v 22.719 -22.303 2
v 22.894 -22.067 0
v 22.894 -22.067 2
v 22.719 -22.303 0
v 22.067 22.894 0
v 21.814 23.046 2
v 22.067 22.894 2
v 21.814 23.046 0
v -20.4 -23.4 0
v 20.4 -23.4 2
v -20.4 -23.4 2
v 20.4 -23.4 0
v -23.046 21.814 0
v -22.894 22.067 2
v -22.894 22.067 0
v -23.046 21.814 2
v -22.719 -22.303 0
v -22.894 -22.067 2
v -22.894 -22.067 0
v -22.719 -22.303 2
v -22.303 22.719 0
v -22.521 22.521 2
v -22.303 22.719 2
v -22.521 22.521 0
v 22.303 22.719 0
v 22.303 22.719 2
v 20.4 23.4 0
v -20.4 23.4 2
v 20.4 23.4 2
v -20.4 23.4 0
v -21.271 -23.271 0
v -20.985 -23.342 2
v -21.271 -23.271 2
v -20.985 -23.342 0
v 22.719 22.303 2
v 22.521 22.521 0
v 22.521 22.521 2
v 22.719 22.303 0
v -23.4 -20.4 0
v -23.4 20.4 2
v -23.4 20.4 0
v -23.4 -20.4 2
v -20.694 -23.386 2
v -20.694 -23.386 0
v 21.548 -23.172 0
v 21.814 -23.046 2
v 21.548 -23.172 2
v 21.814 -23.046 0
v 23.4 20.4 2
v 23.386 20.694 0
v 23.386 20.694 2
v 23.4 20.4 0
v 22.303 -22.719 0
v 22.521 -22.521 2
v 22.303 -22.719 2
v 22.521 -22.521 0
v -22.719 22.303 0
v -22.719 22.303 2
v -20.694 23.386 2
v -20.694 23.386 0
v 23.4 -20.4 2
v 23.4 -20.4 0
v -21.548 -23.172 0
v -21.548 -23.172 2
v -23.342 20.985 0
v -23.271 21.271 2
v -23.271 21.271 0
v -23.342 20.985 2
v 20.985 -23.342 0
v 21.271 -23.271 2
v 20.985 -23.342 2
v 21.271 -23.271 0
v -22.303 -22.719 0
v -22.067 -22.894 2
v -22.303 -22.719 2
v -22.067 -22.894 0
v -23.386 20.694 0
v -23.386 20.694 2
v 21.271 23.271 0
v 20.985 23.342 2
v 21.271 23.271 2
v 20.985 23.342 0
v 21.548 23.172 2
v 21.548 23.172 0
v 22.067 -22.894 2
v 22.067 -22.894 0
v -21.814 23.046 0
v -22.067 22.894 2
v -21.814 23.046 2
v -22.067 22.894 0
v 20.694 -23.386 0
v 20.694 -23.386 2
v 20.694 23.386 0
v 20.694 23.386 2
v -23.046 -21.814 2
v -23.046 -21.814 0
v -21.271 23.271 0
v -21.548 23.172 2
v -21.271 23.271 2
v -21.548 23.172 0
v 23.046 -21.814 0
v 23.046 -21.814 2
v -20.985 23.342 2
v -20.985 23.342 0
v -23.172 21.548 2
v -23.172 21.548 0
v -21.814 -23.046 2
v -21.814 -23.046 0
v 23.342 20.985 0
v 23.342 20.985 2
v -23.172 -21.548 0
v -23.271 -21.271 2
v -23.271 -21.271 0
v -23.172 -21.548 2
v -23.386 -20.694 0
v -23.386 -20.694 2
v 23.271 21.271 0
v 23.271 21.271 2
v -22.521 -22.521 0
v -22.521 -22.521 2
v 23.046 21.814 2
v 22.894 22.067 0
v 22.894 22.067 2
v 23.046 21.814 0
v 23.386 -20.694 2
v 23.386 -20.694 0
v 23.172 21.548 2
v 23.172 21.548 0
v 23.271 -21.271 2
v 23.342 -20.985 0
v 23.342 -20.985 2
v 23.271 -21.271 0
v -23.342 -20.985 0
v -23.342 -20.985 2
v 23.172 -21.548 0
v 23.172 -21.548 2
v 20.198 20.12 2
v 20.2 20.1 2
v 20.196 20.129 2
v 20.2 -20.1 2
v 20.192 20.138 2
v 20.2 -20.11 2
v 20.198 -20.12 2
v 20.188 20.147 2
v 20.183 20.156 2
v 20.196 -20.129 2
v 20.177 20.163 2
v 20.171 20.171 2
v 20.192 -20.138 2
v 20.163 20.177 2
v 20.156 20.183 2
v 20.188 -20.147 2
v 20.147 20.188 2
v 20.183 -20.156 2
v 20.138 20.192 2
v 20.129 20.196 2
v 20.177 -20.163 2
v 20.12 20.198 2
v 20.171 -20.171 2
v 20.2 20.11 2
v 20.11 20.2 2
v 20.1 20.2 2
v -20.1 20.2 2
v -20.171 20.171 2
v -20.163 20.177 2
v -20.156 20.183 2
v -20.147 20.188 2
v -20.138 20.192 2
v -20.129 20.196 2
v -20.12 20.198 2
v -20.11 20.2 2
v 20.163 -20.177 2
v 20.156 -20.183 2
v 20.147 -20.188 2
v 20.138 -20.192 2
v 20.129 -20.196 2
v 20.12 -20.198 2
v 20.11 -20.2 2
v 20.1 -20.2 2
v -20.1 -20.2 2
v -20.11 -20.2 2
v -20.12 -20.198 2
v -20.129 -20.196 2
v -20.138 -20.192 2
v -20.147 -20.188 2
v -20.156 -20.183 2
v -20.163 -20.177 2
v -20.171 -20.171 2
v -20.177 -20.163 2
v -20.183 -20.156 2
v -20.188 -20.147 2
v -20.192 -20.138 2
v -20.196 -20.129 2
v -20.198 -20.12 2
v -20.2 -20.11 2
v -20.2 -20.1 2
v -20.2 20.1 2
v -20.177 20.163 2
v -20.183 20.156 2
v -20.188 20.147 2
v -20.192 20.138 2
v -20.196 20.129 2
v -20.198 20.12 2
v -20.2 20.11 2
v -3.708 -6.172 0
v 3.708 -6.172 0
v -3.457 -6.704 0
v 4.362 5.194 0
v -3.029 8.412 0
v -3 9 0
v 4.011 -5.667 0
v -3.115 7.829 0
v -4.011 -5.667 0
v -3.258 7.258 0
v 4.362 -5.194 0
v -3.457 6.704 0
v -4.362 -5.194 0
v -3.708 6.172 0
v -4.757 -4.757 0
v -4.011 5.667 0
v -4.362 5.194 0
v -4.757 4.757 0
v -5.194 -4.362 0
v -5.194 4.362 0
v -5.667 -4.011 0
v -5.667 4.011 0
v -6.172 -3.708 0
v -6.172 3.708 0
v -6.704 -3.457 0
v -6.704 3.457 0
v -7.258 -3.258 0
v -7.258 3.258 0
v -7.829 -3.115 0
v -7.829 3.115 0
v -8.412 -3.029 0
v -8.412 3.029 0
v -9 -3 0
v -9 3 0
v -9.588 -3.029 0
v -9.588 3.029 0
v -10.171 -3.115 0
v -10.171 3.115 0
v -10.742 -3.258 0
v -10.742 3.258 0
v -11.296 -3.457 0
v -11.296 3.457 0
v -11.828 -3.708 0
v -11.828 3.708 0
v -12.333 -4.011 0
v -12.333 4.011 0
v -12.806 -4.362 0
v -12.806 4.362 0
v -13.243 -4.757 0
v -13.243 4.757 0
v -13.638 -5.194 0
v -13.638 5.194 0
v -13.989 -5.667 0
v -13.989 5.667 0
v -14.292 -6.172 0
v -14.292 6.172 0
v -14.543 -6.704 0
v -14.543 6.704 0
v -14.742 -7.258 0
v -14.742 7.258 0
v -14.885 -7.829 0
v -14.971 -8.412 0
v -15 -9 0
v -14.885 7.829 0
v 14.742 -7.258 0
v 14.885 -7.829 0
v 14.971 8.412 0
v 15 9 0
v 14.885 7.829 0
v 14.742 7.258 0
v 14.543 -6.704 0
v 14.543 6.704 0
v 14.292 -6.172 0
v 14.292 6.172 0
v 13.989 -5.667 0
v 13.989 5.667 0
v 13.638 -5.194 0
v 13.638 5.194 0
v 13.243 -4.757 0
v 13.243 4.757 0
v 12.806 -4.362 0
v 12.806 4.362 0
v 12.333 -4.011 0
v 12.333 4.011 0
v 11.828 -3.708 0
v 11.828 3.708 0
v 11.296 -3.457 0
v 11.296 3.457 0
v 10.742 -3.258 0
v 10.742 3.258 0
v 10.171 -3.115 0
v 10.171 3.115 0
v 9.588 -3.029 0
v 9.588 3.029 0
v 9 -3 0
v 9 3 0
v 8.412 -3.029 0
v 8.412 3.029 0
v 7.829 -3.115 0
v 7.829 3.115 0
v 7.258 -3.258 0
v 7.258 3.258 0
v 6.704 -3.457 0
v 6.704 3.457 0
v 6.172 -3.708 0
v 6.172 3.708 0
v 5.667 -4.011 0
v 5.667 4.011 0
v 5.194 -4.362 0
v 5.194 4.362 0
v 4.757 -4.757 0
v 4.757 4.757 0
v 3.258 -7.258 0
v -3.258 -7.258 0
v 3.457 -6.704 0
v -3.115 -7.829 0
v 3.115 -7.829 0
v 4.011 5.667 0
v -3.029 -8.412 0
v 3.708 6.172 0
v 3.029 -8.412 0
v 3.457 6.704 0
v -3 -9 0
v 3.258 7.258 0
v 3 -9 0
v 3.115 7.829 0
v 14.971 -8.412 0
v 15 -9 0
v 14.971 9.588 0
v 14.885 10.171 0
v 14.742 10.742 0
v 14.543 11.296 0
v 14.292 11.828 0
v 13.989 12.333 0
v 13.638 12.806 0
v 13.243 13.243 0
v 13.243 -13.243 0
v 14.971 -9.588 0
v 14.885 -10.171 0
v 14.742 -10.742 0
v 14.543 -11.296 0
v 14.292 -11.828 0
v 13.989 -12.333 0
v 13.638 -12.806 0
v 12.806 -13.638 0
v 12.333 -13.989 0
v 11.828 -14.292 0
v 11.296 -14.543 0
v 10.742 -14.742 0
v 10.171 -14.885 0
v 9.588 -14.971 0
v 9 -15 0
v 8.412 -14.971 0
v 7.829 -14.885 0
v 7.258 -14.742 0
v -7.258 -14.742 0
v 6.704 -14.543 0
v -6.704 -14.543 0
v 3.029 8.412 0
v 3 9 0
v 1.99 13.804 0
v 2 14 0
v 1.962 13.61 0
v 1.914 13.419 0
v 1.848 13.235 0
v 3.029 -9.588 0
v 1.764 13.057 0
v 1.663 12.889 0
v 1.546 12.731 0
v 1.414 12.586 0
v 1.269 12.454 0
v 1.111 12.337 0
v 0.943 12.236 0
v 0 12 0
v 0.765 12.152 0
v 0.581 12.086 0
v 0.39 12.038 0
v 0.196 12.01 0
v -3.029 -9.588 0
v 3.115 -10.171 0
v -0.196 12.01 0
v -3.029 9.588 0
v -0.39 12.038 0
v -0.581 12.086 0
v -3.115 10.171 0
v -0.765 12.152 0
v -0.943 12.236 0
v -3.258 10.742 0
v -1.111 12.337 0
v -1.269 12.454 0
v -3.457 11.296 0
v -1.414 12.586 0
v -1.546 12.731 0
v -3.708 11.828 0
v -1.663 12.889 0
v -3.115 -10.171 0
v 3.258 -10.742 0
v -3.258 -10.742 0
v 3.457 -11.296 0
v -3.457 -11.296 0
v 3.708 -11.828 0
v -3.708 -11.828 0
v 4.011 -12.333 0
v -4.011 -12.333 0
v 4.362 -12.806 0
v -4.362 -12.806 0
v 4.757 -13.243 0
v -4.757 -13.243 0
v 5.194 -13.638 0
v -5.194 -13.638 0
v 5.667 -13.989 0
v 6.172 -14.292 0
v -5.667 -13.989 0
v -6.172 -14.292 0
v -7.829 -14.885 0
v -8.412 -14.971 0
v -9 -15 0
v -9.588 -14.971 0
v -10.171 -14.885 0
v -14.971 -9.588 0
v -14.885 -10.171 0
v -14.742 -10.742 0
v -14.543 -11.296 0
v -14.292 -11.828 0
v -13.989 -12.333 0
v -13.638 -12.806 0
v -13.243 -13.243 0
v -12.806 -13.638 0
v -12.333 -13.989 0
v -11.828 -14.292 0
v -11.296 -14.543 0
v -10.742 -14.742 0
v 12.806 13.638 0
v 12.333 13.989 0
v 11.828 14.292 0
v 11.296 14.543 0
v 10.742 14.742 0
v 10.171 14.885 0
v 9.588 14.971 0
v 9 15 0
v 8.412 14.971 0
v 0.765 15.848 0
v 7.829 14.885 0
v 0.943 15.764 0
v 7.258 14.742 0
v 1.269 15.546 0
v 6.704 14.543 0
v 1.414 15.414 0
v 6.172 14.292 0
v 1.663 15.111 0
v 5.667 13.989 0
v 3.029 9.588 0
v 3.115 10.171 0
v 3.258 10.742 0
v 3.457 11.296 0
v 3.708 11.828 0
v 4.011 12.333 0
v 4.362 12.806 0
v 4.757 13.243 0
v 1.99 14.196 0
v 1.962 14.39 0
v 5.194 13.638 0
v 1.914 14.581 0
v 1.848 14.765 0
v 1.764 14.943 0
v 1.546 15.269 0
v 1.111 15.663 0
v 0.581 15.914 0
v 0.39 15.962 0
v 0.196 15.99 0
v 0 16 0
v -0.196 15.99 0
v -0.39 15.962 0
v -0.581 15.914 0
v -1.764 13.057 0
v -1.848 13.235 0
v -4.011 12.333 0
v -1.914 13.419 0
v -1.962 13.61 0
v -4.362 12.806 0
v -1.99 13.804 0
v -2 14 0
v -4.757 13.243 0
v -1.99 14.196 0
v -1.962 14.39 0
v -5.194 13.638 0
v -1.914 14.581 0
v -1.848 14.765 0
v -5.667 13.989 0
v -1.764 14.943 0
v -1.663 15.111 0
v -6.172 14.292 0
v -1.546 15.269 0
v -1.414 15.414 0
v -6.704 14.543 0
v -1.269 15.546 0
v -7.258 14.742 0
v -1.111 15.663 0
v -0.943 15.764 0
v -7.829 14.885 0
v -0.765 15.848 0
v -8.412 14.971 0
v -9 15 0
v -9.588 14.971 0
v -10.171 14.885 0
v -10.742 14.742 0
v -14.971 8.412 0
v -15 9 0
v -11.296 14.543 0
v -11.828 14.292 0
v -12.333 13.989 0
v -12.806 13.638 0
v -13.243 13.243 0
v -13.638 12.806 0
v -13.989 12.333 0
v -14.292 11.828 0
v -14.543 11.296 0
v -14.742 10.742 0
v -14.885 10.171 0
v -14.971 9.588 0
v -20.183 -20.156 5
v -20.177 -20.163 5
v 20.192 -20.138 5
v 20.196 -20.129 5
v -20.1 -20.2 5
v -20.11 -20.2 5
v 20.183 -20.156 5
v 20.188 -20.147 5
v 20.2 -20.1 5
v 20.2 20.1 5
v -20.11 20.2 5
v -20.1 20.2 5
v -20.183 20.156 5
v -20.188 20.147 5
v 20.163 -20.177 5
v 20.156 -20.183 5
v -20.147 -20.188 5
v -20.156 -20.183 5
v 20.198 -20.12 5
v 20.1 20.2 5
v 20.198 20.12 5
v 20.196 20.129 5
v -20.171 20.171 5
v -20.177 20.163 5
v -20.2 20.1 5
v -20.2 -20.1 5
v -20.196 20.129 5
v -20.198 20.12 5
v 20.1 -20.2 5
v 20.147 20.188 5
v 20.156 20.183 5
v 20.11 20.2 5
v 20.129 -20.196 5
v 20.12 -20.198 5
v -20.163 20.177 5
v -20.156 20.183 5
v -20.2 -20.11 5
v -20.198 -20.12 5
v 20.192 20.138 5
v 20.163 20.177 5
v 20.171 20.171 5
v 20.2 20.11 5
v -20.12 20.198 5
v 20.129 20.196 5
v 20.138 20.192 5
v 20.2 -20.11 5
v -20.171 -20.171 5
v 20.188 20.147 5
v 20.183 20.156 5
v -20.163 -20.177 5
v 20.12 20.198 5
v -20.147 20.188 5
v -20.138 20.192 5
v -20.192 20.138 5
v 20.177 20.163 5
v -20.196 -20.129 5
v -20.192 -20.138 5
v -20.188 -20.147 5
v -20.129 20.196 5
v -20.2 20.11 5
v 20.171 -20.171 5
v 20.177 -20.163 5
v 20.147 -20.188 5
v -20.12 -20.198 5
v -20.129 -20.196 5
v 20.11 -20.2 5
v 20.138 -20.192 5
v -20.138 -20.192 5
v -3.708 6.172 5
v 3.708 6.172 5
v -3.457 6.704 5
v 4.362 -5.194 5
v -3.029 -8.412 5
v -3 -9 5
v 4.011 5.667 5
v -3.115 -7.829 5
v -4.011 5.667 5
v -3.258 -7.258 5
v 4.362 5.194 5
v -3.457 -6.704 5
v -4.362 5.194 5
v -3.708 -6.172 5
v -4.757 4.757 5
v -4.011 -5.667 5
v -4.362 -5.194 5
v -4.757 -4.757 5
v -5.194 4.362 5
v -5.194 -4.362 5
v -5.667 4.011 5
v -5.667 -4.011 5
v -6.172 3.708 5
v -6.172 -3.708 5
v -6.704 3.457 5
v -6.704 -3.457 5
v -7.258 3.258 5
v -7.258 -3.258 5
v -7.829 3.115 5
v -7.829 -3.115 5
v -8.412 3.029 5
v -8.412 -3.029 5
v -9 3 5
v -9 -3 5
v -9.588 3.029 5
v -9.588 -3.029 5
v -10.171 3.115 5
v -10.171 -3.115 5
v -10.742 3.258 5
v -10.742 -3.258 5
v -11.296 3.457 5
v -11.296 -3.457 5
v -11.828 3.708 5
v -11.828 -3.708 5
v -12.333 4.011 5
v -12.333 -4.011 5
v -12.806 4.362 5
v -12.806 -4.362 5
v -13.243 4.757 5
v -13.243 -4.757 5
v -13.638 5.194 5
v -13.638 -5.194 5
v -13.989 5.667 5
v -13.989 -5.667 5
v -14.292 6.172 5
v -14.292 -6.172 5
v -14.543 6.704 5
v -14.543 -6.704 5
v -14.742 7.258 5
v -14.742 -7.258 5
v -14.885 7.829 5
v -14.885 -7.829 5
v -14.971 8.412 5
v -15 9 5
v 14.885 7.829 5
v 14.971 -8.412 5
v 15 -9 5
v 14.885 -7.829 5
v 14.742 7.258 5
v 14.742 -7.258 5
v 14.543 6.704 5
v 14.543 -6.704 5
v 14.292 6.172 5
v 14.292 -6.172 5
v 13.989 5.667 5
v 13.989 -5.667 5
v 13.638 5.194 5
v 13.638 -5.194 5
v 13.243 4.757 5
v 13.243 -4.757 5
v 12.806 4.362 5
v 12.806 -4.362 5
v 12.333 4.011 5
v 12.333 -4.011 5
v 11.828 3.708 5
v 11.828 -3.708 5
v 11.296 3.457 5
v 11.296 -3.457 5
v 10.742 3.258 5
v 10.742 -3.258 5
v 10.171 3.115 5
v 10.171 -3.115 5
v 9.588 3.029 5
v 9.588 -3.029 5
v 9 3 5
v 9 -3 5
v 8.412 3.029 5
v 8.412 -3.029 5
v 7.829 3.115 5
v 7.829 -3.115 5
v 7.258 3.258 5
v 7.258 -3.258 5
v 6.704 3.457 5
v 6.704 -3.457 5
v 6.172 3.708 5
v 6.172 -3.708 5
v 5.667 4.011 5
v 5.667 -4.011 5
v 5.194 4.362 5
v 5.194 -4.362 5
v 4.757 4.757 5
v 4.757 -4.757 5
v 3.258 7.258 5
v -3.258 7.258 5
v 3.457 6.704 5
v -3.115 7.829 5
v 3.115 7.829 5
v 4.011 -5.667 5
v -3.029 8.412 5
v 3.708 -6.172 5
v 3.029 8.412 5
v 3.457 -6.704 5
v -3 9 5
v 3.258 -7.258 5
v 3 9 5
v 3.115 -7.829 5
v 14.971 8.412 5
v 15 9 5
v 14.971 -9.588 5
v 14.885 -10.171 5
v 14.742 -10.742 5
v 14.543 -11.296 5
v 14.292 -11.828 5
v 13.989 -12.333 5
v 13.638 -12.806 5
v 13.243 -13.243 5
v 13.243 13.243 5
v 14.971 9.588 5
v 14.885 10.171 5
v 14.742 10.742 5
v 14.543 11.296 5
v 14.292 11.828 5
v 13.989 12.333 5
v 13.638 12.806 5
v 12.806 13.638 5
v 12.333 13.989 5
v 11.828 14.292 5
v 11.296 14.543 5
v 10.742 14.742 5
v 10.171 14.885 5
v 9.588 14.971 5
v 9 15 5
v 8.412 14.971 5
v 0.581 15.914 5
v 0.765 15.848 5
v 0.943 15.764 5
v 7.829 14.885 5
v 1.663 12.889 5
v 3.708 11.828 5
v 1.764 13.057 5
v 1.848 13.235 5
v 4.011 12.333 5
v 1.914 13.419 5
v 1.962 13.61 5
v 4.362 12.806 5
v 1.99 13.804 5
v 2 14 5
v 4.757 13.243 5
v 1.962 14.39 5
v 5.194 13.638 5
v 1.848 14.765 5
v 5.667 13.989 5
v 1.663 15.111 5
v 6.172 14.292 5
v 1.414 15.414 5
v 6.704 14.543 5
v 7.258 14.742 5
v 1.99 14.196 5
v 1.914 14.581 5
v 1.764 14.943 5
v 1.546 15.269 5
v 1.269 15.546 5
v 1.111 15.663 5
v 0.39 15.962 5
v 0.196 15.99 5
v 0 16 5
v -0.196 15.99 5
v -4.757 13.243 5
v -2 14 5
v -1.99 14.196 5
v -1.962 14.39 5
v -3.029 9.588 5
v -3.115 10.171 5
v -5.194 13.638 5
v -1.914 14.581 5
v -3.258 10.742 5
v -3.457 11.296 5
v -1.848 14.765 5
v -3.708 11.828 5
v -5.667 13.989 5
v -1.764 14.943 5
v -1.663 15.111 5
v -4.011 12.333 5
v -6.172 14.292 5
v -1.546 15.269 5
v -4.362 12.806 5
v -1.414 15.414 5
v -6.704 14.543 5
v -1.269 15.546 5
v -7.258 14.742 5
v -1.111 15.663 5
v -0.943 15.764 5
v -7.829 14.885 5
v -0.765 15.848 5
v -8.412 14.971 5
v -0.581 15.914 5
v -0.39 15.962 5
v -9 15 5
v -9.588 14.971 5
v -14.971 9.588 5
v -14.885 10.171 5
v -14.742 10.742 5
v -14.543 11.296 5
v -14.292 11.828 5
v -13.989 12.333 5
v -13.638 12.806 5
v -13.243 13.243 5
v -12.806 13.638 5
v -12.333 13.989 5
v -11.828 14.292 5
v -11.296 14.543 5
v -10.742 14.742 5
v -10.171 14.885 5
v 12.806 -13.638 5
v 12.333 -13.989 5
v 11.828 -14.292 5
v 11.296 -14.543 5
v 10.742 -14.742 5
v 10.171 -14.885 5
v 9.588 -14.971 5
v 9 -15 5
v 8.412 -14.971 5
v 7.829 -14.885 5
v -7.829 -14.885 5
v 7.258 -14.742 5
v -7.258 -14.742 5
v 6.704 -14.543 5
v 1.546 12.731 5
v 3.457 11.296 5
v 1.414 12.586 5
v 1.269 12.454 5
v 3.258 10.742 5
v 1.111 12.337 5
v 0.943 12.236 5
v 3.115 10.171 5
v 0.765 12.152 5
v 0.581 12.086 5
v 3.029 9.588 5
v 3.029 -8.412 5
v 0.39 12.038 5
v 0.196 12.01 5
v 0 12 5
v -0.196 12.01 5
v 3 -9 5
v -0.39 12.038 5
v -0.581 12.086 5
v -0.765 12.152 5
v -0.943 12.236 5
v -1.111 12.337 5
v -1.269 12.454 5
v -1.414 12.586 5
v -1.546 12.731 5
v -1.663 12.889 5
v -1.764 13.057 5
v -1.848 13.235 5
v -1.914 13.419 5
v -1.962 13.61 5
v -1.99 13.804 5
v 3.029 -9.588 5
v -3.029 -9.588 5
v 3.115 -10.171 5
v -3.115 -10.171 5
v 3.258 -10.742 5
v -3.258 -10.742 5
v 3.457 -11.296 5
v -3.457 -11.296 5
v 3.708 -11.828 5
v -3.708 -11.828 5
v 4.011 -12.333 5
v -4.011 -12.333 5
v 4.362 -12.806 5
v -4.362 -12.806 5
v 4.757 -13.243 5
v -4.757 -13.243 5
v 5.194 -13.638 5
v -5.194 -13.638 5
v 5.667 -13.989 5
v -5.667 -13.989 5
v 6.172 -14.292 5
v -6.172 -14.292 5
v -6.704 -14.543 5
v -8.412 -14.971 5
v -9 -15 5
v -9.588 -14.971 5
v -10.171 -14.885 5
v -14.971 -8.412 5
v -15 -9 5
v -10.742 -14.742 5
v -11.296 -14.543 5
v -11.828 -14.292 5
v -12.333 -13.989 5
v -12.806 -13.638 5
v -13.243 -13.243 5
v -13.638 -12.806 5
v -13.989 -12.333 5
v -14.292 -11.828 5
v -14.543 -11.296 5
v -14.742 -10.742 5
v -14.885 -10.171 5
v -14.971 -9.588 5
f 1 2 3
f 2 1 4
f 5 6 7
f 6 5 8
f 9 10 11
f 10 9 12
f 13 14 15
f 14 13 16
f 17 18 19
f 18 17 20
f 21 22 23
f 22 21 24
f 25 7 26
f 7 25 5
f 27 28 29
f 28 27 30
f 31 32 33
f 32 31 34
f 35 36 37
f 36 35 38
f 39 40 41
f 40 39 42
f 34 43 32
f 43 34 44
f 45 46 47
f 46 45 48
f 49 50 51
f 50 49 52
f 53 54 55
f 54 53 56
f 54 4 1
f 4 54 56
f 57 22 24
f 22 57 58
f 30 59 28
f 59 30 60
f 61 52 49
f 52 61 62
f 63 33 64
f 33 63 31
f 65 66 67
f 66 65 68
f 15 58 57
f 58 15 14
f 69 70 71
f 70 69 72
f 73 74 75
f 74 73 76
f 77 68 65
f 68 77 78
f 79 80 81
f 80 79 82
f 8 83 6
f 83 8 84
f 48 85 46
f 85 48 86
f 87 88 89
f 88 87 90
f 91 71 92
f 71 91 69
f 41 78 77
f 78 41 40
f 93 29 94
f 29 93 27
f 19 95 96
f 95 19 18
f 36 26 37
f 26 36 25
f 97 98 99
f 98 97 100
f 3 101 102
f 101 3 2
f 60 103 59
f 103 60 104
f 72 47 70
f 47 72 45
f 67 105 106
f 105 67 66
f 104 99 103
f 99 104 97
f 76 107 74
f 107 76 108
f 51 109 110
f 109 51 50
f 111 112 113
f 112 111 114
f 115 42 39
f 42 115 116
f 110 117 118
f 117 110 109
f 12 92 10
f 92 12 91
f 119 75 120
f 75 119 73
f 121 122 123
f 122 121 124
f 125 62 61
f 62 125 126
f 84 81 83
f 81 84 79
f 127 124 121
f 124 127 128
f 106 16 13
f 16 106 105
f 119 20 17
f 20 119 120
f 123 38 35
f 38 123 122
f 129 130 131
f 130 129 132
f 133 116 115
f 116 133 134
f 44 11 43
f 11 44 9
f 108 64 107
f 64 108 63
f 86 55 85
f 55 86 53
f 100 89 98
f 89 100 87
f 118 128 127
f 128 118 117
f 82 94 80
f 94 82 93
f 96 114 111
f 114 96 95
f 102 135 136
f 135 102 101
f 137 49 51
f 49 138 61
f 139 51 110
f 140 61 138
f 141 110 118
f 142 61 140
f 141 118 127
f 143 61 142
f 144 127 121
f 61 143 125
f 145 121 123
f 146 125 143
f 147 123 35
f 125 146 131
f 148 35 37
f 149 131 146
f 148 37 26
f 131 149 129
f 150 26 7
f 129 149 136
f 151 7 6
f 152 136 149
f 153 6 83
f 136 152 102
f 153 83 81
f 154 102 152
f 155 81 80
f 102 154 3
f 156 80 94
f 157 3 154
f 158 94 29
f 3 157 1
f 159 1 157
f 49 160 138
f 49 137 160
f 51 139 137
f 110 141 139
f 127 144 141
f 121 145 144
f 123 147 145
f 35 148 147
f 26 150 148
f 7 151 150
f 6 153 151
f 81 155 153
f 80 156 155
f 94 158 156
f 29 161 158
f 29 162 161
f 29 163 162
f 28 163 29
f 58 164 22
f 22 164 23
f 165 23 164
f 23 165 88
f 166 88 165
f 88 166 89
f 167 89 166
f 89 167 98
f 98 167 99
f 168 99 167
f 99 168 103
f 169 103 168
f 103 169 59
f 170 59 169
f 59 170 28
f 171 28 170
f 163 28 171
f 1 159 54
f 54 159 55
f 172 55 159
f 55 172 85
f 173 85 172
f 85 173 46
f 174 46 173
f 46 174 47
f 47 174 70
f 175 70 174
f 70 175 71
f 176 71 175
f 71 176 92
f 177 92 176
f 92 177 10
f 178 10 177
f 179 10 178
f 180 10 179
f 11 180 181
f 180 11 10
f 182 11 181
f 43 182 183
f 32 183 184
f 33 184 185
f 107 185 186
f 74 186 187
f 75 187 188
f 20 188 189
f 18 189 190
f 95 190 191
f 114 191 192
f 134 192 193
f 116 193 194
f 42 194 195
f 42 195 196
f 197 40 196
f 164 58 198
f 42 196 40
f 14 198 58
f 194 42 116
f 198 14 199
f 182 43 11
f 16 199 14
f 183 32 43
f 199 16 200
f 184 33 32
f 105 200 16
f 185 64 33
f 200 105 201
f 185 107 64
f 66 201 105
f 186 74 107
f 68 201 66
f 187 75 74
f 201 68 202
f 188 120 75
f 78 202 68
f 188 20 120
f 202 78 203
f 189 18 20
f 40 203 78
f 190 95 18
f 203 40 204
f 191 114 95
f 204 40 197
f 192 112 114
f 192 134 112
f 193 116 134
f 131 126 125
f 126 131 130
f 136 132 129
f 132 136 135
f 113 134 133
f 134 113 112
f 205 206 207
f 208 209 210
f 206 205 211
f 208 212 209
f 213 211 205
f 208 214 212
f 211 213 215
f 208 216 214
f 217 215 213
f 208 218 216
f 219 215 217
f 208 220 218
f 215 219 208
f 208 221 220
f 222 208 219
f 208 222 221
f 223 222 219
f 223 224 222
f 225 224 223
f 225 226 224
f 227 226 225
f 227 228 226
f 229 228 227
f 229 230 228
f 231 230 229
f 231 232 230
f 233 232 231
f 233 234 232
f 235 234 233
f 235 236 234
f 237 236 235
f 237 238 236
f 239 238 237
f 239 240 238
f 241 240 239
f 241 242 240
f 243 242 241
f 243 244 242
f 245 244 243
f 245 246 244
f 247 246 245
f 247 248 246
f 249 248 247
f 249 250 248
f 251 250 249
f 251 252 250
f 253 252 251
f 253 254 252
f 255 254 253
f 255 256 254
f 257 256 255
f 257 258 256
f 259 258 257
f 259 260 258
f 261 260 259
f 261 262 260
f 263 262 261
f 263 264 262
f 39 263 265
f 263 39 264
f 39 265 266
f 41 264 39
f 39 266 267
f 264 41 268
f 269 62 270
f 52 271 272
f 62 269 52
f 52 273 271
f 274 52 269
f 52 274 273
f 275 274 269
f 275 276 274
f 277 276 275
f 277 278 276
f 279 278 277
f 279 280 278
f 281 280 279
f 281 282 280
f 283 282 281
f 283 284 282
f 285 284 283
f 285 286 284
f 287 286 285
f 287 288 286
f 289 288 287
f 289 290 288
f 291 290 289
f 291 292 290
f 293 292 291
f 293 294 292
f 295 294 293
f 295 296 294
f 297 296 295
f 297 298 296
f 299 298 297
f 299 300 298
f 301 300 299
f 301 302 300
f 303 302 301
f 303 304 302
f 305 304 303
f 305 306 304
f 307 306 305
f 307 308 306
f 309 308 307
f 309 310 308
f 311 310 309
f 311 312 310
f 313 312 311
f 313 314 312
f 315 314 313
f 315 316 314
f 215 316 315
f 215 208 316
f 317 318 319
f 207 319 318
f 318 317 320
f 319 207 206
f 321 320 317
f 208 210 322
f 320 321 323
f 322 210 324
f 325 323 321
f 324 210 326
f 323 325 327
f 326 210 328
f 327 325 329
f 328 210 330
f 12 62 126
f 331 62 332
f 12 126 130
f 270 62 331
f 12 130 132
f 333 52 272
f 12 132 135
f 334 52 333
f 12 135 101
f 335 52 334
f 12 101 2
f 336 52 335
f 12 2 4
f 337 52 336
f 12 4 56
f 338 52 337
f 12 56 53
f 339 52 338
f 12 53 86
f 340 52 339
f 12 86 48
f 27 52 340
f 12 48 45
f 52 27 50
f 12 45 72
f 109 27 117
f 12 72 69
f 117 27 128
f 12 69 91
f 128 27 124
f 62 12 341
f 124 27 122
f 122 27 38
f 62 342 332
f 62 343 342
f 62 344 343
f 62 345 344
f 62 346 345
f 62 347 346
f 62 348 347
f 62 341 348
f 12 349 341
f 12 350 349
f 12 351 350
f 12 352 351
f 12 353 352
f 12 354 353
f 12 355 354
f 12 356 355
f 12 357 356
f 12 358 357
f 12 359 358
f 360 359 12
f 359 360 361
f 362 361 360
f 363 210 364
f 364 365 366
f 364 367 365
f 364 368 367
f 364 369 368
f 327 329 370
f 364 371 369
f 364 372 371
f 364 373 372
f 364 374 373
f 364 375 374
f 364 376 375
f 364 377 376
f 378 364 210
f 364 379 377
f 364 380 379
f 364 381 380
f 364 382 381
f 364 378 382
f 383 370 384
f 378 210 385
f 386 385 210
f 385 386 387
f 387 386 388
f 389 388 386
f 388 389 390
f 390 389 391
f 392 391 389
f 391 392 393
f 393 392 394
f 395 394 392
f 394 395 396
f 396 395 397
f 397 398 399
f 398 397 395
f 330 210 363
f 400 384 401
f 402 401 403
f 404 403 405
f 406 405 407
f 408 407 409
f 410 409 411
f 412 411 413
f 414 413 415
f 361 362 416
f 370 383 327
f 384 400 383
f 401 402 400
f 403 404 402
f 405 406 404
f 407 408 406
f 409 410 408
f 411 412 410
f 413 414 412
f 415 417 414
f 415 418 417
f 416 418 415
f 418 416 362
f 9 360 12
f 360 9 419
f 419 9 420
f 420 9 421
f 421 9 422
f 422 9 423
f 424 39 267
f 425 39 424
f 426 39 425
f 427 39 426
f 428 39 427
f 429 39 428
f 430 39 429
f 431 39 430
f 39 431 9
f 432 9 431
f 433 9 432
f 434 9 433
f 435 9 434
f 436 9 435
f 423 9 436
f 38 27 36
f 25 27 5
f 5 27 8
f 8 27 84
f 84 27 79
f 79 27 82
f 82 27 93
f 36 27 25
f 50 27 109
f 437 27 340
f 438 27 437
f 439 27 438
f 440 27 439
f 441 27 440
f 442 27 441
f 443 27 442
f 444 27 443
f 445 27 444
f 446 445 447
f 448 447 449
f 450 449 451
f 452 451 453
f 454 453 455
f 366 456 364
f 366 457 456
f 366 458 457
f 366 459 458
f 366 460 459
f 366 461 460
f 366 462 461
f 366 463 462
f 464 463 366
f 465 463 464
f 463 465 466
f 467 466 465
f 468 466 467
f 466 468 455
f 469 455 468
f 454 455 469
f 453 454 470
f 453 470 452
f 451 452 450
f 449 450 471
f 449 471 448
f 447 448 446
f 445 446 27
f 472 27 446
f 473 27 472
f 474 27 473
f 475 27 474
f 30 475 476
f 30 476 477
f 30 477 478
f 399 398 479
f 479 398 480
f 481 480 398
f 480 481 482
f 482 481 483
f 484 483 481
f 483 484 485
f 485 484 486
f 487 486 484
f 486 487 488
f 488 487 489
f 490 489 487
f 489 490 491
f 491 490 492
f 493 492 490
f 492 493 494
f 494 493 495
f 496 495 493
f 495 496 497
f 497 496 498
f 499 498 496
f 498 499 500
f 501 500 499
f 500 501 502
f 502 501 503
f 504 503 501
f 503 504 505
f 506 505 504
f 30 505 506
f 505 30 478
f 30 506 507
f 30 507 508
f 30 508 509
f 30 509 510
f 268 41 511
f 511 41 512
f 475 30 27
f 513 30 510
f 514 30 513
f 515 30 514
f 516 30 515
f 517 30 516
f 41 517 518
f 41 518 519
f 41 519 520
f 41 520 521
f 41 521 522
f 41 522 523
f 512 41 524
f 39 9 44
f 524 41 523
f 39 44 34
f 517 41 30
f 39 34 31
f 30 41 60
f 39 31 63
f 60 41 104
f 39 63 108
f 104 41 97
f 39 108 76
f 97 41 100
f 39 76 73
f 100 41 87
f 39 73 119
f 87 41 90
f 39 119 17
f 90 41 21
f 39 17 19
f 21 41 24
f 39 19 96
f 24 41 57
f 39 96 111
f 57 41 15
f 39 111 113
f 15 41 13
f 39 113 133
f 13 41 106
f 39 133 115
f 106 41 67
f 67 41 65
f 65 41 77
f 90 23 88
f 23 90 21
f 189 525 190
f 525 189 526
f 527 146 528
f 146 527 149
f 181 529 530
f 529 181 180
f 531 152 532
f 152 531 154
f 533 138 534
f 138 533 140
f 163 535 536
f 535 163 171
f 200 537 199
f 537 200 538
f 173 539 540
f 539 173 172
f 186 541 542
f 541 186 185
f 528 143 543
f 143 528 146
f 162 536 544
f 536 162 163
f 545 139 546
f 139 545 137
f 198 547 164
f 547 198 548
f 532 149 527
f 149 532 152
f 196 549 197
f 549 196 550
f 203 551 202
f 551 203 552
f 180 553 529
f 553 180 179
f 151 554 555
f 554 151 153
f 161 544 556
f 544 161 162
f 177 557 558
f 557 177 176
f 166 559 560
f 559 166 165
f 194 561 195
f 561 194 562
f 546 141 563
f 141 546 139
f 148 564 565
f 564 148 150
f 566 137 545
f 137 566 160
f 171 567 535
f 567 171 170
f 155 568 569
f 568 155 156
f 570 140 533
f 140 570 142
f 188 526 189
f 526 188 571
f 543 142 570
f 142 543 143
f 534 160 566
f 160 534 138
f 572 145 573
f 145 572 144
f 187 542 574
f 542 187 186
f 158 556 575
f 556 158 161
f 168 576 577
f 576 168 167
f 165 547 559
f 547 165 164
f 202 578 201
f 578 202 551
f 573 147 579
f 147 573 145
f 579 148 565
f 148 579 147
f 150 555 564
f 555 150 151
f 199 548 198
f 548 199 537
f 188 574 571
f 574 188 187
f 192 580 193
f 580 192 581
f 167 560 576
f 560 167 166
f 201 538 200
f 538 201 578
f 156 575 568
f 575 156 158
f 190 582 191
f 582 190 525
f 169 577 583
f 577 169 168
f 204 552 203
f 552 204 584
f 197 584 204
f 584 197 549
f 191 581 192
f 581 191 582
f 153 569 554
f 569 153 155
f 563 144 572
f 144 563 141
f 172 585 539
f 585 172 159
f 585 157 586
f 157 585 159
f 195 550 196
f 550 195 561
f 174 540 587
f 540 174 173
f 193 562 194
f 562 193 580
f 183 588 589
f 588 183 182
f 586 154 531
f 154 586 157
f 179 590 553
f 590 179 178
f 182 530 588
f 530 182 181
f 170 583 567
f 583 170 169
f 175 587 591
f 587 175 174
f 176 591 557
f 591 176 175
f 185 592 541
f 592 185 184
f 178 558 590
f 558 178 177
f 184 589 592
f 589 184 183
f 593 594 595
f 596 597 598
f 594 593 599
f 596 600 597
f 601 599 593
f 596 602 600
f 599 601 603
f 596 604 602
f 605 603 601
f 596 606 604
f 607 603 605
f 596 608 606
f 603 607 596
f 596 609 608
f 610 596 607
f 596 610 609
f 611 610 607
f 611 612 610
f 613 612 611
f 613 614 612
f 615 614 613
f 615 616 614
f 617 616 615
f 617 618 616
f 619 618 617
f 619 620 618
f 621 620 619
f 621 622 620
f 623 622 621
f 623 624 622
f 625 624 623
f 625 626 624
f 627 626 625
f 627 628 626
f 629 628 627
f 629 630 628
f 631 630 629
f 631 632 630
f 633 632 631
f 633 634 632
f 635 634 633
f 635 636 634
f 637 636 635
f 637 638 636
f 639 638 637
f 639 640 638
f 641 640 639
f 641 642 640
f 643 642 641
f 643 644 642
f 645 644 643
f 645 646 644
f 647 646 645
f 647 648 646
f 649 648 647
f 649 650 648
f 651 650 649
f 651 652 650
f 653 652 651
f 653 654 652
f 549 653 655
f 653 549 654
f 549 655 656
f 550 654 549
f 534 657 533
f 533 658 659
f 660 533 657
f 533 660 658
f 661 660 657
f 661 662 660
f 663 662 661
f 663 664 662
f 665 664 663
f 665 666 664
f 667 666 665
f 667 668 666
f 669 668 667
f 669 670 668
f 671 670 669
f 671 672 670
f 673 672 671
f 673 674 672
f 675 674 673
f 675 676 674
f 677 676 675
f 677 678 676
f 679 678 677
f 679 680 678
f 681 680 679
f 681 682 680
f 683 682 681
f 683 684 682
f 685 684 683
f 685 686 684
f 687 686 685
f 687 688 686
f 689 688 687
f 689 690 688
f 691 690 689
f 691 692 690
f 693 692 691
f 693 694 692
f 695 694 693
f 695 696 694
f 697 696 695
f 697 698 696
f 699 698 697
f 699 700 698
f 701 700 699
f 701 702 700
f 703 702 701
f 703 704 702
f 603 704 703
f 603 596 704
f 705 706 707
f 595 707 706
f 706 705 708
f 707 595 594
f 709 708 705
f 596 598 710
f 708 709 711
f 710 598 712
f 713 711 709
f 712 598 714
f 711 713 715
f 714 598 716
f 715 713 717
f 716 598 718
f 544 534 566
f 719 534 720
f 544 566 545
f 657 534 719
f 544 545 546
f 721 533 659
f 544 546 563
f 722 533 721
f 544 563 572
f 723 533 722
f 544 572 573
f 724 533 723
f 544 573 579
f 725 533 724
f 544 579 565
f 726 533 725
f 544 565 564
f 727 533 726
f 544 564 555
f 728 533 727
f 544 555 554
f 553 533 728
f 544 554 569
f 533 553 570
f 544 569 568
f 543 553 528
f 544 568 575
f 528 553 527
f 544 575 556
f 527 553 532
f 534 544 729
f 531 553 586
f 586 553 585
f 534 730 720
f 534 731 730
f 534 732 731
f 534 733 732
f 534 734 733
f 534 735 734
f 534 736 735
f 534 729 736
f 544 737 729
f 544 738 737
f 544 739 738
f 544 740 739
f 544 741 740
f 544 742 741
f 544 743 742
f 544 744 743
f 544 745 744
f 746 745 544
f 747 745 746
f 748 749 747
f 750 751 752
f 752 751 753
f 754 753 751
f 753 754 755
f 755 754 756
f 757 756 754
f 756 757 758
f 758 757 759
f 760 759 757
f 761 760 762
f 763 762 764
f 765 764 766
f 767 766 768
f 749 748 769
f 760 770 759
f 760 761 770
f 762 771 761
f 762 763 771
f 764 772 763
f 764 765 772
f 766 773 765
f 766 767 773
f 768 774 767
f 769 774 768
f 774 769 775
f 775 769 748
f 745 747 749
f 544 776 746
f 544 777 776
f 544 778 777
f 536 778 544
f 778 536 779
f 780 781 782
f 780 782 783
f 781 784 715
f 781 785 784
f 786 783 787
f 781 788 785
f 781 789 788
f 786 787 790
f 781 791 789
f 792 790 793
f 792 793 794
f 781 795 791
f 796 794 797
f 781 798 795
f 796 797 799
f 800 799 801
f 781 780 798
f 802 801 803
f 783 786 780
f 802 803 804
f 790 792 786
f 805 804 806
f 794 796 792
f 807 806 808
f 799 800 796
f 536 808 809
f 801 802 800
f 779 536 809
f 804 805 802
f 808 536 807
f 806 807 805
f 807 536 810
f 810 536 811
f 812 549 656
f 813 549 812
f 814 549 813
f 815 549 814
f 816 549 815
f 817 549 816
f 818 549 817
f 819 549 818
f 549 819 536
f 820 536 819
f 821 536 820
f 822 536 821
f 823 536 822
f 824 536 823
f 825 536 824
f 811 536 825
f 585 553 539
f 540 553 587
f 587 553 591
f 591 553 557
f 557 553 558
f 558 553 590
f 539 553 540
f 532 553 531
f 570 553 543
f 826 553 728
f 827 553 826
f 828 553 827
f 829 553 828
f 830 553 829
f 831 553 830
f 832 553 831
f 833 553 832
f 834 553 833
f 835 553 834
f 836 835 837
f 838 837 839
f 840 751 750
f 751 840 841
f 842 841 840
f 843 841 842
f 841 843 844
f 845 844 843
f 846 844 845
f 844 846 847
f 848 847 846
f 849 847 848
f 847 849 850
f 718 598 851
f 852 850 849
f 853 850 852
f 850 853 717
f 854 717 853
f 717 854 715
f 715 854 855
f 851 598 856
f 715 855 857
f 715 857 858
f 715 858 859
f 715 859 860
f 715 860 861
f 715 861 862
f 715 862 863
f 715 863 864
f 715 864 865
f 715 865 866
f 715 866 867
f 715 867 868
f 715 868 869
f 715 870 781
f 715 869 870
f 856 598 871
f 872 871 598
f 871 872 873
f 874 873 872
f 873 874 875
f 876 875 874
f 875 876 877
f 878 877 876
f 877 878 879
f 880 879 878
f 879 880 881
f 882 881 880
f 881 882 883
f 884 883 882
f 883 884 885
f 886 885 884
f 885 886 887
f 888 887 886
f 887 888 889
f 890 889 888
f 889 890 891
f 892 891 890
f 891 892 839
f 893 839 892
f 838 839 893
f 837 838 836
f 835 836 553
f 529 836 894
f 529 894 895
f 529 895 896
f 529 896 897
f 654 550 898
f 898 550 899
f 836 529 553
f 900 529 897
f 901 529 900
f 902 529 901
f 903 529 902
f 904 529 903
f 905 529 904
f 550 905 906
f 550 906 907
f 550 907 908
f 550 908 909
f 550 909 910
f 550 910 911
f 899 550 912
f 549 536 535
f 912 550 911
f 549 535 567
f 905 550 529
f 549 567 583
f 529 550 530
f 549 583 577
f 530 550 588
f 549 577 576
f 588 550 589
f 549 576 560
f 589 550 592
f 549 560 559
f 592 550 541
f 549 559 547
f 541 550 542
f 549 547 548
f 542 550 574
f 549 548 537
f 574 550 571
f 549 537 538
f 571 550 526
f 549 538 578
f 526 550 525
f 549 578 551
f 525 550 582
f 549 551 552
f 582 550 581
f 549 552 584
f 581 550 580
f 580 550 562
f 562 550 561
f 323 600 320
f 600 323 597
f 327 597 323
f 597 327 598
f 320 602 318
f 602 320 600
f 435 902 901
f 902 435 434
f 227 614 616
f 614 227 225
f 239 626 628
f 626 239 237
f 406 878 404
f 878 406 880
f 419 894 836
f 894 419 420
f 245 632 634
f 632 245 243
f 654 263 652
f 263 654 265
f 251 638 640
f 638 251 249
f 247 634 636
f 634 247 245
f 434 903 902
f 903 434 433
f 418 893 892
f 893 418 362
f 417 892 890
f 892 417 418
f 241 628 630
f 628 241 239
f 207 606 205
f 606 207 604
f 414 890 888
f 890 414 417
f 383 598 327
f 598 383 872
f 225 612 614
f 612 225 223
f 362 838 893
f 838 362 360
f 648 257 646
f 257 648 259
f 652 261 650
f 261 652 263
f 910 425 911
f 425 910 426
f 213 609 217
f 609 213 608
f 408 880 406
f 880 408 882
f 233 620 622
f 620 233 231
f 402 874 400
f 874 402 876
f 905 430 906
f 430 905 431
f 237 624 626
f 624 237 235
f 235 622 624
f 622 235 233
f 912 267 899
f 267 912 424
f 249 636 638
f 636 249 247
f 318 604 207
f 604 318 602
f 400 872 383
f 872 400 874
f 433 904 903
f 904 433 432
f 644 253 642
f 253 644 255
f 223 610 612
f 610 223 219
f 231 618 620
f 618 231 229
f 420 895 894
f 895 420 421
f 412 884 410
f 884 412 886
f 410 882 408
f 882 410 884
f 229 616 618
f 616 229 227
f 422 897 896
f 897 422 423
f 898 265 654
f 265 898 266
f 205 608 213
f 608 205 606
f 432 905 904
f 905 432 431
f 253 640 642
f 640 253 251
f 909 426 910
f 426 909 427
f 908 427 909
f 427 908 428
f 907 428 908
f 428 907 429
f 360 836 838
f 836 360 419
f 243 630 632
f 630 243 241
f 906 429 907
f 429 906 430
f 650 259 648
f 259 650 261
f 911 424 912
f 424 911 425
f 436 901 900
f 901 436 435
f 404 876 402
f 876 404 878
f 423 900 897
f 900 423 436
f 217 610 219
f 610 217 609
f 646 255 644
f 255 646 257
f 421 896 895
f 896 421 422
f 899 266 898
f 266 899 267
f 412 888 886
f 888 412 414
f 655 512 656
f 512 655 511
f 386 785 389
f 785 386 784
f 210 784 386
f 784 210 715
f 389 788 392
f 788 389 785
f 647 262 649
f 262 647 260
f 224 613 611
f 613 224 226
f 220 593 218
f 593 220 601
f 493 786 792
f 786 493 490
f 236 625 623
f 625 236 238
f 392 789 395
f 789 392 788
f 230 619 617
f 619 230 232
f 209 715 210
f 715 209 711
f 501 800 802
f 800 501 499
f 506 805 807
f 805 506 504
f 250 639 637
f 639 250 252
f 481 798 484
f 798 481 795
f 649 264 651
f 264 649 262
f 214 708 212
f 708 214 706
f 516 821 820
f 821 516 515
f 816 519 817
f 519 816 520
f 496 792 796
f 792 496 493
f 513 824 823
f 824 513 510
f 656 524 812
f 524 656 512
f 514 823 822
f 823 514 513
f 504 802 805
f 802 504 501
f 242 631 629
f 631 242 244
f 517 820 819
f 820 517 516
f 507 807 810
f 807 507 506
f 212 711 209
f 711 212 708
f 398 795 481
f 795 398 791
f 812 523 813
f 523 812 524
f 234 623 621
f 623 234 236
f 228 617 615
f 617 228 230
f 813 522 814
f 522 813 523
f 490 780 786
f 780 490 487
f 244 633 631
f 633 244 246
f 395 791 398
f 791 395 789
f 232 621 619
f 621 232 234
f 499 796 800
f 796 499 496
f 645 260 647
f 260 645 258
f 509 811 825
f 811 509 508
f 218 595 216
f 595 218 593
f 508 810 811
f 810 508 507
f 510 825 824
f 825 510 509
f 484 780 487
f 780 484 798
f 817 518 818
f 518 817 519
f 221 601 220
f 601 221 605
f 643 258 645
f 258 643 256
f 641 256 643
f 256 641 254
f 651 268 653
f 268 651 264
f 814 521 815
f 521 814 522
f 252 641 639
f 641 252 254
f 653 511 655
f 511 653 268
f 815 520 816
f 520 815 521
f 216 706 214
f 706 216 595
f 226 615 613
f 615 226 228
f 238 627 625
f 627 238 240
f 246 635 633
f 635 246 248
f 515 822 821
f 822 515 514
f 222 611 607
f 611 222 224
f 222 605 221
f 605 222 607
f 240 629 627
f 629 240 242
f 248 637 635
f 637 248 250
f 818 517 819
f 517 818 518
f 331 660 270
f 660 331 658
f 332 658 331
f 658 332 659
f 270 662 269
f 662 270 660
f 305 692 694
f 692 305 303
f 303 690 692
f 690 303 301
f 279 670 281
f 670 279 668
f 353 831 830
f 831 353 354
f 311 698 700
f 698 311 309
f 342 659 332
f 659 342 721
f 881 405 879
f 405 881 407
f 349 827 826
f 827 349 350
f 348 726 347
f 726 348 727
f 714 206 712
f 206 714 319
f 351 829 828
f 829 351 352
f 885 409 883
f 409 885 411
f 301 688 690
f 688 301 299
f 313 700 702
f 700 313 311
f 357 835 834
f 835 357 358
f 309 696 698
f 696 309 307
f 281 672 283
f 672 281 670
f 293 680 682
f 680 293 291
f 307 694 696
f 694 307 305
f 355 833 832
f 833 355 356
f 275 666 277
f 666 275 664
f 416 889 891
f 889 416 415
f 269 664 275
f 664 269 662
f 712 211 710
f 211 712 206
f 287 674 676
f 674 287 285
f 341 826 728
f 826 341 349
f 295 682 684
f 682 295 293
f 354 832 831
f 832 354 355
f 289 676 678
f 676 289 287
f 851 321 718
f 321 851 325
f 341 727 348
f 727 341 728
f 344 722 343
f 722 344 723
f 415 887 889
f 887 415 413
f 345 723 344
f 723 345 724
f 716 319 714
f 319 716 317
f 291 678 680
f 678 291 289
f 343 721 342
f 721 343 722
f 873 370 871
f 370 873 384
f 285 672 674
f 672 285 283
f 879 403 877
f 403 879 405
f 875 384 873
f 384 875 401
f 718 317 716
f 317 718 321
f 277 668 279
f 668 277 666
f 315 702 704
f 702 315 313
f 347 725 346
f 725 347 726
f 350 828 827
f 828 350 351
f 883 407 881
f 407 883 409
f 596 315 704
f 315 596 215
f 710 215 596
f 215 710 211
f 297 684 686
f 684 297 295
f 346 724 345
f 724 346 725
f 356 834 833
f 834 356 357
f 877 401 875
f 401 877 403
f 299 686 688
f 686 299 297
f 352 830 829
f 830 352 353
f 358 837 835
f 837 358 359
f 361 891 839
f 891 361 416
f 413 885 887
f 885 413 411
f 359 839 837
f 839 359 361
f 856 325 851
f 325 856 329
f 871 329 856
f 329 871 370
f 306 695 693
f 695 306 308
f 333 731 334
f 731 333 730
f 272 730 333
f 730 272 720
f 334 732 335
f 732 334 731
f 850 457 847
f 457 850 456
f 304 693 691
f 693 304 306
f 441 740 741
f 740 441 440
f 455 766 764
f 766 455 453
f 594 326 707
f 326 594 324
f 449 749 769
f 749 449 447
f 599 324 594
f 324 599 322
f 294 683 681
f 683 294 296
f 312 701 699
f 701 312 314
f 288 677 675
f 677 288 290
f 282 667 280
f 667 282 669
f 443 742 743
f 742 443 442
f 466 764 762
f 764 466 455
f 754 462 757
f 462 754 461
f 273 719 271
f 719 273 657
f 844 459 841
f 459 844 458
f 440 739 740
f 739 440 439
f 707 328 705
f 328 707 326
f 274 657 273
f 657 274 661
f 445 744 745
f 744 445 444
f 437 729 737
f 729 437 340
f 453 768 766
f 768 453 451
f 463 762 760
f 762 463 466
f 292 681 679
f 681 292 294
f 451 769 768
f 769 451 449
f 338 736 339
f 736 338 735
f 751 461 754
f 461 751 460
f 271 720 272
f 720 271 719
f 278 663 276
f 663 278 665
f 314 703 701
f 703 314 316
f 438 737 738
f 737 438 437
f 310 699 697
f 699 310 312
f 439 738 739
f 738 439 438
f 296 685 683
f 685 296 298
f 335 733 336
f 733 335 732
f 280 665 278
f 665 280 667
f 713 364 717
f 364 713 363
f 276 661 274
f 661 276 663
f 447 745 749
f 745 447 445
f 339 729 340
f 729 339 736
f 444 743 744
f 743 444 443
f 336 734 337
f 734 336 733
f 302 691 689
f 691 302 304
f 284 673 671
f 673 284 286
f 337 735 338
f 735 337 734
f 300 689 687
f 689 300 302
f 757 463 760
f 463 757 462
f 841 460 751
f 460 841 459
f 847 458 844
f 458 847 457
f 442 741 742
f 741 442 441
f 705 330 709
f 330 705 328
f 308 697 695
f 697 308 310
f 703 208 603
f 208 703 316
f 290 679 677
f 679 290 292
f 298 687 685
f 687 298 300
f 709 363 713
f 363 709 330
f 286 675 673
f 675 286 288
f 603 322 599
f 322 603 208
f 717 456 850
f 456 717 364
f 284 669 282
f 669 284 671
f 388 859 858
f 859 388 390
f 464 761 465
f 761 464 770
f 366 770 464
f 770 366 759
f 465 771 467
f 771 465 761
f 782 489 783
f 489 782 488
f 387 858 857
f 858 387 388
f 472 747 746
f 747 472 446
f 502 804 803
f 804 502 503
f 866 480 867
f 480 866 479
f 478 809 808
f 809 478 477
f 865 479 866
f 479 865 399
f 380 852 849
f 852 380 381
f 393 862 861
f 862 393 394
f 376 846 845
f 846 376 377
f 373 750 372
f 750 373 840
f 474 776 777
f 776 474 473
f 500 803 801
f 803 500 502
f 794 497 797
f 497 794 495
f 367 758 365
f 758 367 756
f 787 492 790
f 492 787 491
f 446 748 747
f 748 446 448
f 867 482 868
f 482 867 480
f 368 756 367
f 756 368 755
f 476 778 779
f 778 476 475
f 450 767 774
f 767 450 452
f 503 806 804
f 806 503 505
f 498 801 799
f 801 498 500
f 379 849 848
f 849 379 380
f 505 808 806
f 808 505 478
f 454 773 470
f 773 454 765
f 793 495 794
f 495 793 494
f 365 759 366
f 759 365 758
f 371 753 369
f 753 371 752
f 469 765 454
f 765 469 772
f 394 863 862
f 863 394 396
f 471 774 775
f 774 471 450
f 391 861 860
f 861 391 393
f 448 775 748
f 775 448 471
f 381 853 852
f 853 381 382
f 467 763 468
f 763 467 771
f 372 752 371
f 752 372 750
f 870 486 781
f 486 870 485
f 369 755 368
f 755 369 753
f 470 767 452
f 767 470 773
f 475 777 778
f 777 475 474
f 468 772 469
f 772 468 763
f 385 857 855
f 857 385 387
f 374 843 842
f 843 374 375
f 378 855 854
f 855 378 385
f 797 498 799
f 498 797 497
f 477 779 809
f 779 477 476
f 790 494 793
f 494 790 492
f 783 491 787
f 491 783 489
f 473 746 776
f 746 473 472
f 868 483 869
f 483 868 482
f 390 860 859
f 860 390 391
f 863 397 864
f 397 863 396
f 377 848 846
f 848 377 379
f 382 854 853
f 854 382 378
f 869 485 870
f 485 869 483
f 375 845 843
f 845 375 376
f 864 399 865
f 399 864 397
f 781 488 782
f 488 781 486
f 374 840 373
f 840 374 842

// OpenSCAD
// datum-cap -- the cover for a datum-core tray.
//
// Four contact openings on a 2 x 2 grid and one indicator light pipe, over a
// lip that drops into the core's cavity. Split from datum-core because the
// enclosure record asks for one core body and separate pieces around it, and
// because a `show` parameter selecting between two objects is two parts
// wearing one name -- its bounds depended on which mode you asked for.
//
// It renders from its own defaults and knows nothing about any particular PCB.

$fn = 64;

/* [Board] */
board_x = 40;
board_y = 40;
board_clearance = 0.4;

/* [Print settings] */
// House constants, print-validated on QM hardware -- parts/footpedal/button.scad.
walls = 3;
tolerence = .4;

/* [Plate] */
lid_t = 2.0;
corner_r = 3.0;
lip_h = 3.0;

/* [Indicator] */
indicator_d = 4.0;
indicator_x = 0;
indicator_y = 14;

/* [Contacts] */
contact_d = 12.0;
contact_pitch_x = 18.0;
contact_pitch_y = 18.0;

// ---------------------------------------------------------------- derived --

wall = walls;
lip_clearance = tolerence / 2;

cavity_x = board_x + 2 * board_clearance;
cavity_y = board_y + 2 * board_clearance;
outer_x = cavity_x + 2 * wall;
outer_y = cavity_y + 2 * wall;
lid_h = lid_t + lip_h;

_CORNERS = [[-1, -1], [-1, 1], [1, -1], [1, 1]];

// ----------------------------------------------------------------- shapes --

module rrect(x, y, h, r) {
    hull()
        for (sx = [-1, 1], sy = [-1, 1])
            translate([sx * (x / 2 - r), sy * (y / 2 - r), 0])
                cylinder(r = r, h = h);
}

module contact_positions() {
    for (sx = [-1, 1], sy = [-1, 1])
        translate([sx * contact_pitch_x / 2, sy * contact_pitch_y / 2, 0])
            children();
}

// ------------------------------------------------------------------ render --

// Modelled plate-down, which is how it prints.
difference() {
    union() {
        rrect(outer_x, outer_y, lid_t, corner_r);
        translate([0, 0, lid_t])
            rrect(cavity_x - 2 * lip_clearance,
                  cavity_y - 2 * lip_clearance,
                  lip_h,
                  max(0.1, corner_r - wall));
    }

    translate([0, 0, -0.1])
        contact_positions()
            cylinder(d = contact_d, h = lid_h + 0.2);

    translate([indicator_x, indicator_y, -0.1])
        cylinder(d = indicator_d, h = lid_h + 0.2);
}
